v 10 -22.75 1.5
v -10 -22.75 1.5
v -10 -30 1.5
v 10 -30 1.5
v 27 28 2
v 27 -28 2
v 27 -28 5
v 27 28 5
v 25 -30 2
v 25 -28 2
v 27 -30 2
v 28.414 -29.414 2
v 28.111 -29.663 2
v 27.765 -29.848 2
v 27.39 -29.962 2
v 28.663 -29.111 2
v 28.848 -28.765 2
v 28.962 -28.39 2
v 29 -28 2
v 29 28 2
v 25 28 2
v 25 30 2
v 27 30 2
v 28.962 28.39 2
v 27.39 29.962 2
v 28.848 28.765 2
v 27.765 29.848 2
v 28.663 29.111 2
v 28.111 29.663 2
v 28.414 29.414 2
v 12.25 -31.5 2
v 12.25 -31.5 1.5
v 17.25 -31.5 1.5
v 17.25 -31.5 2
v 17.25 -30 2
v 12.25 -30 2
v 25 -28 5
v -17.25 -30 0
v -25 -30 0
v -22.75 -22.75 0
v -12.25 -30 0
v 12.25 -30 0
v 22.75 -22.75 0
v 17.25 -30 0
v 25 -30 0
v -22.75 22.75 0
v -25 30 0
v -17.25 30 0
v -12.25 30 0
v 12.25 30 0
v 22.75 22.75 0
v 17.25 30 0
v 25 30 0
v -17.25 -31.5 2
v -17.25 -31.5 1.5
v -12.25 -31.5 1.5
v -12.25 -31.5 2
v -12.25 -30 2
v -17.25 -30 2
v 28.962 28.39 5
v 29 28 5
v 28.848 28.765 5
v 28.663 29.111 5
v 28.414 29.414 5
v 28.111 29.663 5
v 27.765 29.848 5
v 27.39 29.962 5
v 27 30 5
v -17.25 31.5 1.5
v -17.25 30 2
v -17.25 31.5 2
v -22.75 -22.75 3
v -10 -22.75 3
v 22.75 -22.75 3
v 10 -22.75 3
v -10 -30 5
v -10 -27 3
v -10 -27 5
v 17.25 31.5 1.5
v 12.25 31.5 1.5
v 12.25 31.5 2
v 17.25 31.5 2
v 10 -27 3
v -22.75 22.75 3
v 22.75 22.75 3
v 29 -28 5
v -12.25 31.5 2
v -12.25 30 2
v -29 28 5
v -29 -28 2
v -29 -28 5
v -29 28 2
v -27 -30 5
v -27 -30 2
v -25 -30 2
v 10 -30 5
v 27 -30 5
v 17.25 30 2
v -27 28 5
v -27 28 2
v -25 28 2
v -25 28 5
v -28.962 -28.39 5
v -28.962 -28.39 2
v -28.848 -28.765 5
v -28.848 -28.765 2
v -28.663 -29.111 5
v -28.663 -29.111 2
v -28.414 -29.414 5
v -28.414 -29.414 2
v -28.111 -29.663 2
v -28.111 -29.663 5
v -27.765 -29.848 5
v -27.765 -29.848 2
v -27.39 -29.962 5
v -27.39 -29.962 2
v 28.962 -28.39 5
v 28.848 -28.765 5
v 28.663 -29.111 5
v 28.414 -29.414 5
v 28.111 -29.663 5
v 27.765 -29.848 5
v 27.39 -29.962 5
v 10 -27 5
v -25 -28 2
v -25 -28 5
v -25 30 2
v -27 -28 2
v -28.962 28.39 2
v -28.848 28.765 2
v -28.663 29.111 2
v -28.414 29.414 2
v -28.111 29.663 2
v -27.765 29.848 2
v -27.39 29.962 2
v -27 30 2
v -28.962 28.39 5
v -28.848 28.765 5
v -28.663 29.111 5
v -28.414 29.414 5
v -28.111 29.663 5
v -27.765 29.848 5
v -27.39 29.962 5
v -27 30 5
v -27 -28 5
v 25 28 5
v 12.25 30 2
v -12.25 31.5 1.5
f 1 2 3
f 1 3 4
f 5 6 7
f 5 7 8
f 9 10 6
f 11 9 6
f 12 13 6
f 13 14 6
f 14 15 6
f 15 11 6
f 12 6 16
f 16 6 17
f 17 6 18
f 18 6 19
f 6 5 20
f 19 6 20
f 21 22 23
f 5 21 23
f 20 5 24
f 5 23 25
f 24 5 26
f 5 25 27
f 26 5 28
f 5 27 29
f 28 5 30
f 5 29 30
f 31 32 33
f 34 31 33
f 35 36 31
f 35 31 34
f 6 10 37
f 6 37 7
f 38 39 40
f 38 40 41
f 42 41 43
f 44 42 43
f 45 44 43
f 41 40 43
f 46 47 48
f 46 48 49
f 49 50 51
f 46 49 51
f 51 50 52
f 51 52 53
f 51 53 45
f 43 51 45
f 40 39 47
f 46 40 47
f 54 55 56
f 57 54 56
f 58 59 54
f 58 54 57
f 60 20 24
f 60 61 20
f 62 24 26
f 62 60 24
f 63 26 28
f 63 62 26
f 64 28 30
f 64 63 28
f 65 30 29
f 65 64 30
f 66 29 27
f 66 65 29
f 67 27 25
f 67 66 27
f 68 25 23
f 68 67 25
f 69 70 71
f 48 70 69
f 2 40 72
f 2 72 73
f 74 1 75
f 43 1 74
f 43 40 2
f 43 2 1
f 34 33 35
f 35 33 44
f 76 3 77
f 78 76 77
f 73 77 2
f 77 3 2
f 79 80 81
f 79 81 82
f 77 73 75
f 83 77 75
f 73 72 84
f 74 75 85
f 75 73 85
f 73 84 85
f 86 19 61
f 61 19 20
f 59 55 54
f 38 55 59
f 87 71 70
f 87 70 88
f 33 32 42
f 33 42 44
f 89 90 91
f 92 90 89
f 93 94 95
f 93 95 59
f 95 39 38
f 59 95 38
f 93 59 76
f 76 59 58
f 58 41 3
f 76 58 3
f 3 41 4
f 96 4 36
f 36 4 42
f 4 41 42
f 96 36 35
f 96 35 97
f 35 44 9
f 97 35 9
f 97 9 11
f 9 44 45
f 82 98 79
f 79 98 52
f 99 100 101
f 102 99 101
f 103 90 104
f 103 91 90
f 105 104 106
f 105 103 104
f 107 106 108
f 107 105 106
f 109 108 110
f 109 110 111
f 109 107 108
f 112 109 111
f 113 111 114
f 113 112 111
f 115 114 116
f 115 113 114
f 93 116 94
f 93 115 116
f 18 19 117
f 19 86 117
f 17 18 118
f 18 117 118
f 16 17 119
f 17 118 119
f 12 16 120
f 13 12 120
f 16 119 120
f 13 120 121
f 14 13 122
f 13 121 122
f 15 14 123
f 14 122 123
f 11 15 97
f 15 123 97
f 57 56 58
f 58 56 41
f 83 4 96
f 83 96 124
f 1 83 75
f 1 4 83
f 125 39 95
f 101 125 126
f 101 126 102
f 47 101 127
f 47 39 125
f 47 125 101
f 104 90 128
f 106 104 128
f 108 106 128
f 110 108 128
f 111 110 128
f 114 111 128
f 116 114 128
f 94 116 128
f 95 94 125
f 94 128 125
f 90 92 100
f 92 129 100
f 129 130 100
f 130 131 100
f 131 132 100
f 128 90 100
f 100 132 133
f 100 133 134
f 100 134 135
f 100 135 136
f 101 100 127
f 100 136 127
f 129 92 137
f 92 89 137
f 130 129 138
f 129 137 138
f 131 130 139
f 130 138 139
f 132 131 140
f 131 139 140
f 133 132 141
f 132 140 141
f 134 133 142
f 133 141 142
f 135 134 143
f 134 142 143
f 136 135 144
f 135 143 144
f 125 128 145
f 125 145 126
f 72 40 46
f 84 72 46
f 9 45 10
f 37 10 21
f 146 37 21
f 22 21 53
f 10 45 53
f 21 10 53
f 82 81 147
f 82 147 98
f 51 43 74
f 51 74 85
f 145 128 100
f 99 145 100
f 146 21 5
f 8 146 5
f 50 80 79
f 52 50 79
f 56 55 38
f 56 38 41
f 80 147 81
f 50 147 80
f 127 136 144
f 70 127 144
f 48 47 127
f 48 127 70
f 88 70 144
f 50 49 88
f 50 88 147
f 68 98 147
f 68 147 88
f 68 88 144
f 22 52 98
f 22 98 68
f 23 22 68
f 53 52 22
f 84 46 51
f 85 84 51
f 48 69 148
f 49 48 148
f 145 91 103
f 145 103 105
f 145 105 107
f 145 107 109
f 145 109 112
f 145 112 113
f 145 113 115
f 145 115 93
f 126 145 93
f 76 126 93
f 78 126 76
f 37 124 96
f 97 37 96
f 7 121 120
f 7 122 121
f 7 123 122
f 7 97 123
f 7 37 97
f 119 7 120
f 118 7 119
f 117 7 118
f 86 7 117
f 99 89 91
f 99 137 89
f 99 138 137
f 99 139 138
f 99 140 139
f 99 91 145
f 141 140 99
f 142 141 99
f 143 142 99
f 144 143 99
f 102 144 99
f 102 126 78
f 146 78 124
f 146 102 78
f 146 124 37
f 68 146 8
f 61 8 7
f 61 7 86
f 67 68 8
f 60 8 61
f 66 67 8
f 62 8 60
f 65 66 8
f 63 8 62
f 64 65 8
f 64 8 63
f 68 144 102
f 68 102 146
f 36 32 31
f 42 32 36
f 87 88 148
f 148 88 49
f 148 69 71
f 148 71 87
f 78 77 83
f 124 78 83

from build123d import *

# Parameters (mm, degrees)
F0_W      = 50
F0_H      = 60
F1_DEPTH  = 5
F4_START  = 2
F3_W      = 58
F3_H      = 60
F4_DEPTH  = 3
F2_W      = 45.5
F2_H      = 45.5
F5_DEPTH  = 3
F7_START  = 1.5
F6_W      = 20
F6_H      = 30
F7_DEPTH  = 1.5
F8_W      = 2
F8_H      = 56
F9_DEPTH  = 25
F10_R     = 2
F11_W     = 5
F11_H     = 1.5
F12_DEPTH = 2
F13_SIZE  = 1.5
F15_START = 3
F14_W     = 20
F14_H     = 3
F15_DEPTH = 2


with BuildPart() as f1:
    # F0 (on Top) → F1 (new body)
    with BuildSketch(Plane.XY):
        Rectangle(F0_W, F0_H)
    extrude(amount=F1_DEPTH)

    # F3 (on Top) → F4 (join)
    with BuildSketch(Plane.XY.offset(F4_START)):
        Rectangle(F3_W, F3_H)
    extrude(amount=F4_DEPTH)

    # F2 (on Top) → F5 (cut)
    with BuildSketch(Plane.XY):
        Rectangle(F2_W, F2_H)
    extrude(amount=F5_DEPTH, mode=Mode.SUBTRACT)

    # F6 (on Top) → F7 (cut)
    with BuildSketch(Plane.XY.offset(F7_START)):
        with Locations((0, -15)):
            Rectangle(F6_W, F6_H)
    extrude(amount=F7_DEPTH, mode=Mode.SUBTRACT)

    # F8 (on Top) → F9 (cut)
    with BuildSketch(Plane.XY):
        with Locations((-26, 0)):
            Rectangle(F8_W, F8_H)
        with Locations((26, 0)):
            Rectangle(F8_W, F8_H)
    extrude(amount=F9_DEPTH, mode=Mode.SUBTRACT)

    # F10
    f10_edges = [f1.edges().sort_by_distance(p)[0] for p in [
        (29, -30, 3.5),
        (-29, -30, 3.5),
        (-29, 30, 3.5),
        (29, 30, 3.5),
    ]]
    fillet(f10_edges, radius=F10_R)

    # F11 (on Top) → F12 (join)
    with BuildSketch(Plane.XY):
        with Locations((-14.75, -30.75)):
            Rectangle(F11_W, F11_H)
        with Locations((14.75, -30.75)):
            Rectangle(F11_W, F11_H)
        with Locations((14.75, 30.75)):
            Rectangle(F11_W, F11_H)
        with Locations((-14.75, 30.75)):
            Rectangle(F11_W, F11_H)
    extrude(amount=F12_DEPTH)

    # F13
    f13_edges = [f1.edges().sort_by_distance(p)[0] for p in [
        (-14.75, -31.5, 0),
        (14.75, -31.5, 0),
        (14.75, 31.5, 0),
        (-14.75, 31.5, 0),
    ]]
    chamfer(f13_edges, length=F13_SIZE)

    # F14 (on Top) → F15 (cut)
    with BuildSketch(Plane.XY.offset(F15_START)):
        with Locations((0, -28.5)):
            Rectangle(F14_W, F14_H)
    extrude(amount=F15_DEPTH, mode=Mode.SUBTRACT)


solid = f1.part
